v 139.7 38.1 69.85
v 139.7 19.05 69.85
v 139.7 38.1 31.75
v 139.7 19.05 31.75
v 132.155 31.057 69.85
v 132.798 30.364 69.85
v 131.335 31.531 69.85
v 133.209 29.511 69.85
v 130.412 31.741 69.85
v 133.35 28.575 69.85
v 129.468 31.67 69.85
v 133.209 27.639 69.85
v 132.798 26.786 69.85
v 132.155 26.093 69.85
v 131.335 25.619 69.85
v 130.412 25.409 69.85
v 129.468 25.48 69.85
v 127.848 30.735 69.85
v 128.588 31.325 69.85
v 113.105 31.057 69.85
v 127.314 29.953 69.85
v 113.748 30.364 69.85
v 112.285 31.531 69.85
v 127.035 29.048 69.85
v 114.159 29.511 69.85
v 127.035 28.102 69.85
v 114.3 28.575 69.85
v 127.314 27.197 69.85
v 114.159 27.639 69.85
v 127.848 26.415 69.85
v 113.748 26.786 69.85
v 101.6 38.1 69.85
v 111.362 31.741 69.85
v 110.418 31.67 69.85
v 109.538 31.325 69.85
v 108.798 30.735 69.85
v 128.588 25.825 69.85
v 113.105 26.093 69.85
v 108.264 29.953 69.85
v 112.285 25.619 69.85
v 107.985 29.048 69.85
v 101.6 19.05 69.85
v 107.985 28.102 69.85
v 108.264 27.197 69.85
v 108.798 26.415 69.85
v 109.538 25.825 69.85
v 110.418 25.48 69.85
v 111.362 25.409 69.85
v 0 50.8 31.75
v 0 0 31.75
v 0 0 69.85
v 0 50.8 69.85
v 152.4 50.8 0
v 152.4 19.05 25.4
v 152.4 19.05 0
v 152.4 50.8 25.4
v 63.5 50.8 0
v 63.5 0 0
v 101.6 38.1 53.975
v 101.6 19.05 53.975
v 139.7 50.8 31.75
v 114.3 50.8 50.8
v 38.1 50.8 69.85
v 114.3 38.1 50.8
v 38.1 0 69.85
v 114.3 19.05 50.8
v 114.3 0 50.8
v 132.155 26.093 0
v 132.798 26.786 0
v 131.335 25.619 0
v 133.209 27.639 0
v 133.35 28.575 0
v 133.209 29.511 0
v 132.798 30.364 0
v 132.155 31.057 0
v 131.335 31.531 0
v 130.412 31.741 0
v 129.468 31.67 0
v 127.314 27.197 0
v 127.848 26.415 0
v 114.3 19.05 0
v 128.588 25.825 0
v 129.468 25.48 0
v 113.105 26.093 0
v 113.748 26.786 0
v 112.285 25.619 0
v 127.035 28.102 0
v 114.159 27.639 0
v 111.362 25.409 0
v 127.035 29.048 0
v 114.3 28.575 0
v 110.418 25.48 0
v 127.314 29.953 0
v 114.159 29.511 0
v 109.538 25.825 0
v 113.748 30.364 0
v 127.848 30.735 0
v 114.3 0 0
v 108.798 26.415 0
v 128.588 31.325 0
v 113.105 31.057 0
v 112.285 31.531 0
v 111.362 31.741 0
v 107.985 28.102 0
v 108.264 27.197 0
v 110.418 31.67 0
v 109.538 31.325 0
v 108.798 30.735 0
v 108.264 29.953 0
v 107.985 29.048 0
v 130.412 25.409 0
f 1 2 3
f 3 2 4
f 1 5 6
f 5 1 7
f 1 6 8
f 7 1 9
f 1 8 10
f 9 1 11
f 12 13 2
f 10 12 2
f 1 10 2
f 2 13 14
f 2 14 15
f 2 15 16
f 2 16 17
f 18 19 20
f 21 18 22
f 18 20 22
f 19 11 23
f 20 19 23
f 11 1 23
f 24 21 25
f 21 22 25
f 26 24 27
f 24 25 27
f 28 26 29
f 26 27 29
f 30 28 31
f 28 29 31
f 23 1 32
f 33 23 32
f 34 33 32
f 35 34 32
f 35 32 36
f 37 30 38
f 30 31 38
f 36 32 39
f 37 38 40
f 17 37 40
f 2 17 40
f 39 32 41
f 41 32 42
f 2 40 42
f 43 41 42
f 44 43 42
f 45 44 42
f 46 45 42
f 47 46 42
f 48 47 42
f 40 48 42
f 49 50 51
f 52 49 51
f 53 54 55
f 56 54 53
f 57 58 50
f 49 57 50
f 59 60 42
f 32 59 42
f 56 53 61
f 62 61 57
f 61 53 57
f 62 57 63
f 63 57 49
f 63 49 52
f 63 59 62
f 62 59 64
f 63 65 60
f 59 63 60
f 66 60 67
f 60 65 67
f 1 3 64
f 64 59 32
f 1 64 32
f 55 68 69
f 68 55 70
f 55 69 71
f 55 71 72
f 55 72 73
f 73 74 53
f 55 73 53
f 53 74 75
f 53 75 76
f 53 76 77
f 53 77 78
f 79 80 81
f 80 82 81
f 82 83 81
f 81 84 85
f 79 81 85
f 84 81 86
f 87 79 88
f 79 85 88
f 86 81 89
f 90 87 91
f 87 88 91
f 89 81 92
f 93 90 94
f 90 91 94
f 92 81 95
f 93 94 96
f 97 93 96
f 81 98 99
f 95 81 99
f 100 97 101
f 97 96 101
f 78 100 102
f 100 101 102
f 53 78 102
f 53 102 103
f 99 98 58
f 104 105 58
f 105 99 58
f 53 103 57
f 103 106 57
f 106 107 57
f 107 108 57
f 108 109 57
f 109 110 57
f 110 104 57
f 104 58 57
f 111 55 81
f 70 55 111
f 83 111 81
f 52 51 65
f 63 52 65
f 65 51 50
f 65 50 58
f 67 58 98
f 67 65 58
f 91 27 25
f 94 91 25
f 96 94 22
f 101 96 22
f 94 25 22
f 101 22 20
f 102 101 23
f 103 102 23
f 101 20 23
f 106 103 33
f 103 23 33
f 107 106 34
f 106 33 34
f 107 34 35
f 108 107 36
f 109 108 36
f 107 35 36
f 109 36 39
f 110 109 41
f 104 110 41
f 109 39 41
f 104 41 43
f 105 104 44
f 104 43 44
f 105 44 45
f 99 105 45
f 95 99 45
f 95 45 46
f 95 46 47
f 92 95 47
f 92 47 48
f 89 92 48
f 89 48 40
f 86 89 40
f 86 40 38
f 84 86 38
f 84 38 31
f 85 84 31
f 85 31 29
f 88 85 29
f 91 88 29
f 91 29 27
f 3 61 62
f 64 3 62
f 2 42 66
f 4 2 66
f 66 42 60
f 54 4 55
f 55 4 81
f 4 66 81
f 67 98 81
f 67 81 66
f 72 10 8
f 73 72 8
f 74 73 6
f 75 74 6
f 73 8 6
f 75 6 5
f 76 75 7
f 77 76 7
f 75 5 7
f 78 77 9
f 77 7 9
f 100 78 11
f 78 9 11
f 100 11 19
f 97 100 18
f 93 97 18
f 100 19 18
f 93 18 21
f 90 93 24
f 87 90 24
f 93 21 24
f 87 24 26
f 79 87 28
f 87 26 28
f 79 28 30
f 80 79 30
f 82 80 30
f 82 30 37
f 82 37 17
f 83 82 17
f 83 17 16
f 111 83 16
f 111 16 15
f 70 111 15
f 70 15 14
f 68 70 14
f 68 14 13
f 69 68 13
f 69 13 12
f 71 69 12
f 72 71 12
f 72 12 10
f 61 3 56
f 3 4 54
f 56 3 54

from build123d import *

# Parameters (mm, degrees)
F0_W      = 114.3
F0_H      = 69.85
F1_DEPTH  = 50.8
F3_DEPTH  = 76.2
F4_DEPTH  = 19.05
F6_DEPTH  = 12.7
F8_DEPTH  = 76.2
F10_DEPTH = 38.1
F12_DEPTH = 76.2
F14_DEPTH = 12.7
F15_R     = 3.175
F16_DEPTH = 76.2


with BuildPart() as f1:
    # F0 (on Front) → F1 (new body)
    with BuildSketch(Plane.XZ):
        with Locations((57.15, 34.925)):
            Rectangle(F0_W, F0_H)
    extrude(amount=-F1_DEPTH)

    # F2 (on face) → F3 (cut)
    with BuildSketch(Plane.XZ):
        Polygon((0, 0), (63.5, 0), (0, 31.75), align=None)
    extrude(amount=-F3_DEPTH, mode=Mode.SUBTRACT)

    # F2 (on face) → F4 (cut)
    with BuildSketch(Plane.XZ):
        Polygon((38.1, 69.85), (114.3, 50.8), (114.3, 69.85), align=None)
    extrude(amount=-F4_DEPTH, mode=Mode.SUBTRACT)

    # F5 (on face) → F6 (cut)
    with BuildSketch(Plane(origin=(0, 50.8, 0), x_dir=(-1, 0, 0), z_dir=(0, 1, 0))):
        Polygon((-114.3, 50.8), (-38.1, 69.85), (-114.3, 69.85), align=None)
    extrude(amount=-F6_DEPTH, mode=Mode.SUBTRACT)

    # F7 (on face) → F8 (cut)
    with BuildSketch(Plane.XZ.offset(-19.05)):
        Polygon((101.6, 53.975), (101.6, 69.85), (38.1, 69.85), align=None)
    extrude(amount=-F8_DEPTH, mode=Mode.SUBTRACT)

    # F9 (on face) → F10 (join)
    with BuildSketch(Plane.YZ.offset(114.3)):
        Polygon((38.1, 69.85), (19.05, 69.85), (19.05, 50.8), (19.05, 0), (50.8, 0), (50.8, 50.8), (38.1, 50.8), align=None)
    extrude(amount=F10_DEPTH)

    # F11 (on face) → F12 (cut)
    with BuildSketch(Plane.XZ.offset(-19.05)):
        Polygon((139.7, 69.85), (139.7, 31.75), (152.4, 25.4), (152.4, 69.85), align=None)
    extrude(amount=-F12_DEPTH, mode=Mode.SUBTRACT)

    # F13 (on face) → F14 (cut)
    with BuildSketch(Plane(origin=(0, 50.8, 0), x_dir=(-1, 0, 0), z_dir=(0, 1, 0))):
        Polygon((-139.7, 31.75), (-114.3, 50.8), (-139.7, 50.8), align=None)
    extrude(amount=-F14_DEPTH, mode=Mode.SUBTRACT)

    # F15 (on face) → F16 (cut)
    with BuildSketch(Plane.XY.offset(69.85)):
        with Locations((111.125, 28.575)):
            Circle(F15_R)
        with Locations((130.175, 28.575)):
            Circle(F15_R)
    extrude(amount=-F16_DEPTH, mode=Mode.SUBTRACT)


solid = f1.part
